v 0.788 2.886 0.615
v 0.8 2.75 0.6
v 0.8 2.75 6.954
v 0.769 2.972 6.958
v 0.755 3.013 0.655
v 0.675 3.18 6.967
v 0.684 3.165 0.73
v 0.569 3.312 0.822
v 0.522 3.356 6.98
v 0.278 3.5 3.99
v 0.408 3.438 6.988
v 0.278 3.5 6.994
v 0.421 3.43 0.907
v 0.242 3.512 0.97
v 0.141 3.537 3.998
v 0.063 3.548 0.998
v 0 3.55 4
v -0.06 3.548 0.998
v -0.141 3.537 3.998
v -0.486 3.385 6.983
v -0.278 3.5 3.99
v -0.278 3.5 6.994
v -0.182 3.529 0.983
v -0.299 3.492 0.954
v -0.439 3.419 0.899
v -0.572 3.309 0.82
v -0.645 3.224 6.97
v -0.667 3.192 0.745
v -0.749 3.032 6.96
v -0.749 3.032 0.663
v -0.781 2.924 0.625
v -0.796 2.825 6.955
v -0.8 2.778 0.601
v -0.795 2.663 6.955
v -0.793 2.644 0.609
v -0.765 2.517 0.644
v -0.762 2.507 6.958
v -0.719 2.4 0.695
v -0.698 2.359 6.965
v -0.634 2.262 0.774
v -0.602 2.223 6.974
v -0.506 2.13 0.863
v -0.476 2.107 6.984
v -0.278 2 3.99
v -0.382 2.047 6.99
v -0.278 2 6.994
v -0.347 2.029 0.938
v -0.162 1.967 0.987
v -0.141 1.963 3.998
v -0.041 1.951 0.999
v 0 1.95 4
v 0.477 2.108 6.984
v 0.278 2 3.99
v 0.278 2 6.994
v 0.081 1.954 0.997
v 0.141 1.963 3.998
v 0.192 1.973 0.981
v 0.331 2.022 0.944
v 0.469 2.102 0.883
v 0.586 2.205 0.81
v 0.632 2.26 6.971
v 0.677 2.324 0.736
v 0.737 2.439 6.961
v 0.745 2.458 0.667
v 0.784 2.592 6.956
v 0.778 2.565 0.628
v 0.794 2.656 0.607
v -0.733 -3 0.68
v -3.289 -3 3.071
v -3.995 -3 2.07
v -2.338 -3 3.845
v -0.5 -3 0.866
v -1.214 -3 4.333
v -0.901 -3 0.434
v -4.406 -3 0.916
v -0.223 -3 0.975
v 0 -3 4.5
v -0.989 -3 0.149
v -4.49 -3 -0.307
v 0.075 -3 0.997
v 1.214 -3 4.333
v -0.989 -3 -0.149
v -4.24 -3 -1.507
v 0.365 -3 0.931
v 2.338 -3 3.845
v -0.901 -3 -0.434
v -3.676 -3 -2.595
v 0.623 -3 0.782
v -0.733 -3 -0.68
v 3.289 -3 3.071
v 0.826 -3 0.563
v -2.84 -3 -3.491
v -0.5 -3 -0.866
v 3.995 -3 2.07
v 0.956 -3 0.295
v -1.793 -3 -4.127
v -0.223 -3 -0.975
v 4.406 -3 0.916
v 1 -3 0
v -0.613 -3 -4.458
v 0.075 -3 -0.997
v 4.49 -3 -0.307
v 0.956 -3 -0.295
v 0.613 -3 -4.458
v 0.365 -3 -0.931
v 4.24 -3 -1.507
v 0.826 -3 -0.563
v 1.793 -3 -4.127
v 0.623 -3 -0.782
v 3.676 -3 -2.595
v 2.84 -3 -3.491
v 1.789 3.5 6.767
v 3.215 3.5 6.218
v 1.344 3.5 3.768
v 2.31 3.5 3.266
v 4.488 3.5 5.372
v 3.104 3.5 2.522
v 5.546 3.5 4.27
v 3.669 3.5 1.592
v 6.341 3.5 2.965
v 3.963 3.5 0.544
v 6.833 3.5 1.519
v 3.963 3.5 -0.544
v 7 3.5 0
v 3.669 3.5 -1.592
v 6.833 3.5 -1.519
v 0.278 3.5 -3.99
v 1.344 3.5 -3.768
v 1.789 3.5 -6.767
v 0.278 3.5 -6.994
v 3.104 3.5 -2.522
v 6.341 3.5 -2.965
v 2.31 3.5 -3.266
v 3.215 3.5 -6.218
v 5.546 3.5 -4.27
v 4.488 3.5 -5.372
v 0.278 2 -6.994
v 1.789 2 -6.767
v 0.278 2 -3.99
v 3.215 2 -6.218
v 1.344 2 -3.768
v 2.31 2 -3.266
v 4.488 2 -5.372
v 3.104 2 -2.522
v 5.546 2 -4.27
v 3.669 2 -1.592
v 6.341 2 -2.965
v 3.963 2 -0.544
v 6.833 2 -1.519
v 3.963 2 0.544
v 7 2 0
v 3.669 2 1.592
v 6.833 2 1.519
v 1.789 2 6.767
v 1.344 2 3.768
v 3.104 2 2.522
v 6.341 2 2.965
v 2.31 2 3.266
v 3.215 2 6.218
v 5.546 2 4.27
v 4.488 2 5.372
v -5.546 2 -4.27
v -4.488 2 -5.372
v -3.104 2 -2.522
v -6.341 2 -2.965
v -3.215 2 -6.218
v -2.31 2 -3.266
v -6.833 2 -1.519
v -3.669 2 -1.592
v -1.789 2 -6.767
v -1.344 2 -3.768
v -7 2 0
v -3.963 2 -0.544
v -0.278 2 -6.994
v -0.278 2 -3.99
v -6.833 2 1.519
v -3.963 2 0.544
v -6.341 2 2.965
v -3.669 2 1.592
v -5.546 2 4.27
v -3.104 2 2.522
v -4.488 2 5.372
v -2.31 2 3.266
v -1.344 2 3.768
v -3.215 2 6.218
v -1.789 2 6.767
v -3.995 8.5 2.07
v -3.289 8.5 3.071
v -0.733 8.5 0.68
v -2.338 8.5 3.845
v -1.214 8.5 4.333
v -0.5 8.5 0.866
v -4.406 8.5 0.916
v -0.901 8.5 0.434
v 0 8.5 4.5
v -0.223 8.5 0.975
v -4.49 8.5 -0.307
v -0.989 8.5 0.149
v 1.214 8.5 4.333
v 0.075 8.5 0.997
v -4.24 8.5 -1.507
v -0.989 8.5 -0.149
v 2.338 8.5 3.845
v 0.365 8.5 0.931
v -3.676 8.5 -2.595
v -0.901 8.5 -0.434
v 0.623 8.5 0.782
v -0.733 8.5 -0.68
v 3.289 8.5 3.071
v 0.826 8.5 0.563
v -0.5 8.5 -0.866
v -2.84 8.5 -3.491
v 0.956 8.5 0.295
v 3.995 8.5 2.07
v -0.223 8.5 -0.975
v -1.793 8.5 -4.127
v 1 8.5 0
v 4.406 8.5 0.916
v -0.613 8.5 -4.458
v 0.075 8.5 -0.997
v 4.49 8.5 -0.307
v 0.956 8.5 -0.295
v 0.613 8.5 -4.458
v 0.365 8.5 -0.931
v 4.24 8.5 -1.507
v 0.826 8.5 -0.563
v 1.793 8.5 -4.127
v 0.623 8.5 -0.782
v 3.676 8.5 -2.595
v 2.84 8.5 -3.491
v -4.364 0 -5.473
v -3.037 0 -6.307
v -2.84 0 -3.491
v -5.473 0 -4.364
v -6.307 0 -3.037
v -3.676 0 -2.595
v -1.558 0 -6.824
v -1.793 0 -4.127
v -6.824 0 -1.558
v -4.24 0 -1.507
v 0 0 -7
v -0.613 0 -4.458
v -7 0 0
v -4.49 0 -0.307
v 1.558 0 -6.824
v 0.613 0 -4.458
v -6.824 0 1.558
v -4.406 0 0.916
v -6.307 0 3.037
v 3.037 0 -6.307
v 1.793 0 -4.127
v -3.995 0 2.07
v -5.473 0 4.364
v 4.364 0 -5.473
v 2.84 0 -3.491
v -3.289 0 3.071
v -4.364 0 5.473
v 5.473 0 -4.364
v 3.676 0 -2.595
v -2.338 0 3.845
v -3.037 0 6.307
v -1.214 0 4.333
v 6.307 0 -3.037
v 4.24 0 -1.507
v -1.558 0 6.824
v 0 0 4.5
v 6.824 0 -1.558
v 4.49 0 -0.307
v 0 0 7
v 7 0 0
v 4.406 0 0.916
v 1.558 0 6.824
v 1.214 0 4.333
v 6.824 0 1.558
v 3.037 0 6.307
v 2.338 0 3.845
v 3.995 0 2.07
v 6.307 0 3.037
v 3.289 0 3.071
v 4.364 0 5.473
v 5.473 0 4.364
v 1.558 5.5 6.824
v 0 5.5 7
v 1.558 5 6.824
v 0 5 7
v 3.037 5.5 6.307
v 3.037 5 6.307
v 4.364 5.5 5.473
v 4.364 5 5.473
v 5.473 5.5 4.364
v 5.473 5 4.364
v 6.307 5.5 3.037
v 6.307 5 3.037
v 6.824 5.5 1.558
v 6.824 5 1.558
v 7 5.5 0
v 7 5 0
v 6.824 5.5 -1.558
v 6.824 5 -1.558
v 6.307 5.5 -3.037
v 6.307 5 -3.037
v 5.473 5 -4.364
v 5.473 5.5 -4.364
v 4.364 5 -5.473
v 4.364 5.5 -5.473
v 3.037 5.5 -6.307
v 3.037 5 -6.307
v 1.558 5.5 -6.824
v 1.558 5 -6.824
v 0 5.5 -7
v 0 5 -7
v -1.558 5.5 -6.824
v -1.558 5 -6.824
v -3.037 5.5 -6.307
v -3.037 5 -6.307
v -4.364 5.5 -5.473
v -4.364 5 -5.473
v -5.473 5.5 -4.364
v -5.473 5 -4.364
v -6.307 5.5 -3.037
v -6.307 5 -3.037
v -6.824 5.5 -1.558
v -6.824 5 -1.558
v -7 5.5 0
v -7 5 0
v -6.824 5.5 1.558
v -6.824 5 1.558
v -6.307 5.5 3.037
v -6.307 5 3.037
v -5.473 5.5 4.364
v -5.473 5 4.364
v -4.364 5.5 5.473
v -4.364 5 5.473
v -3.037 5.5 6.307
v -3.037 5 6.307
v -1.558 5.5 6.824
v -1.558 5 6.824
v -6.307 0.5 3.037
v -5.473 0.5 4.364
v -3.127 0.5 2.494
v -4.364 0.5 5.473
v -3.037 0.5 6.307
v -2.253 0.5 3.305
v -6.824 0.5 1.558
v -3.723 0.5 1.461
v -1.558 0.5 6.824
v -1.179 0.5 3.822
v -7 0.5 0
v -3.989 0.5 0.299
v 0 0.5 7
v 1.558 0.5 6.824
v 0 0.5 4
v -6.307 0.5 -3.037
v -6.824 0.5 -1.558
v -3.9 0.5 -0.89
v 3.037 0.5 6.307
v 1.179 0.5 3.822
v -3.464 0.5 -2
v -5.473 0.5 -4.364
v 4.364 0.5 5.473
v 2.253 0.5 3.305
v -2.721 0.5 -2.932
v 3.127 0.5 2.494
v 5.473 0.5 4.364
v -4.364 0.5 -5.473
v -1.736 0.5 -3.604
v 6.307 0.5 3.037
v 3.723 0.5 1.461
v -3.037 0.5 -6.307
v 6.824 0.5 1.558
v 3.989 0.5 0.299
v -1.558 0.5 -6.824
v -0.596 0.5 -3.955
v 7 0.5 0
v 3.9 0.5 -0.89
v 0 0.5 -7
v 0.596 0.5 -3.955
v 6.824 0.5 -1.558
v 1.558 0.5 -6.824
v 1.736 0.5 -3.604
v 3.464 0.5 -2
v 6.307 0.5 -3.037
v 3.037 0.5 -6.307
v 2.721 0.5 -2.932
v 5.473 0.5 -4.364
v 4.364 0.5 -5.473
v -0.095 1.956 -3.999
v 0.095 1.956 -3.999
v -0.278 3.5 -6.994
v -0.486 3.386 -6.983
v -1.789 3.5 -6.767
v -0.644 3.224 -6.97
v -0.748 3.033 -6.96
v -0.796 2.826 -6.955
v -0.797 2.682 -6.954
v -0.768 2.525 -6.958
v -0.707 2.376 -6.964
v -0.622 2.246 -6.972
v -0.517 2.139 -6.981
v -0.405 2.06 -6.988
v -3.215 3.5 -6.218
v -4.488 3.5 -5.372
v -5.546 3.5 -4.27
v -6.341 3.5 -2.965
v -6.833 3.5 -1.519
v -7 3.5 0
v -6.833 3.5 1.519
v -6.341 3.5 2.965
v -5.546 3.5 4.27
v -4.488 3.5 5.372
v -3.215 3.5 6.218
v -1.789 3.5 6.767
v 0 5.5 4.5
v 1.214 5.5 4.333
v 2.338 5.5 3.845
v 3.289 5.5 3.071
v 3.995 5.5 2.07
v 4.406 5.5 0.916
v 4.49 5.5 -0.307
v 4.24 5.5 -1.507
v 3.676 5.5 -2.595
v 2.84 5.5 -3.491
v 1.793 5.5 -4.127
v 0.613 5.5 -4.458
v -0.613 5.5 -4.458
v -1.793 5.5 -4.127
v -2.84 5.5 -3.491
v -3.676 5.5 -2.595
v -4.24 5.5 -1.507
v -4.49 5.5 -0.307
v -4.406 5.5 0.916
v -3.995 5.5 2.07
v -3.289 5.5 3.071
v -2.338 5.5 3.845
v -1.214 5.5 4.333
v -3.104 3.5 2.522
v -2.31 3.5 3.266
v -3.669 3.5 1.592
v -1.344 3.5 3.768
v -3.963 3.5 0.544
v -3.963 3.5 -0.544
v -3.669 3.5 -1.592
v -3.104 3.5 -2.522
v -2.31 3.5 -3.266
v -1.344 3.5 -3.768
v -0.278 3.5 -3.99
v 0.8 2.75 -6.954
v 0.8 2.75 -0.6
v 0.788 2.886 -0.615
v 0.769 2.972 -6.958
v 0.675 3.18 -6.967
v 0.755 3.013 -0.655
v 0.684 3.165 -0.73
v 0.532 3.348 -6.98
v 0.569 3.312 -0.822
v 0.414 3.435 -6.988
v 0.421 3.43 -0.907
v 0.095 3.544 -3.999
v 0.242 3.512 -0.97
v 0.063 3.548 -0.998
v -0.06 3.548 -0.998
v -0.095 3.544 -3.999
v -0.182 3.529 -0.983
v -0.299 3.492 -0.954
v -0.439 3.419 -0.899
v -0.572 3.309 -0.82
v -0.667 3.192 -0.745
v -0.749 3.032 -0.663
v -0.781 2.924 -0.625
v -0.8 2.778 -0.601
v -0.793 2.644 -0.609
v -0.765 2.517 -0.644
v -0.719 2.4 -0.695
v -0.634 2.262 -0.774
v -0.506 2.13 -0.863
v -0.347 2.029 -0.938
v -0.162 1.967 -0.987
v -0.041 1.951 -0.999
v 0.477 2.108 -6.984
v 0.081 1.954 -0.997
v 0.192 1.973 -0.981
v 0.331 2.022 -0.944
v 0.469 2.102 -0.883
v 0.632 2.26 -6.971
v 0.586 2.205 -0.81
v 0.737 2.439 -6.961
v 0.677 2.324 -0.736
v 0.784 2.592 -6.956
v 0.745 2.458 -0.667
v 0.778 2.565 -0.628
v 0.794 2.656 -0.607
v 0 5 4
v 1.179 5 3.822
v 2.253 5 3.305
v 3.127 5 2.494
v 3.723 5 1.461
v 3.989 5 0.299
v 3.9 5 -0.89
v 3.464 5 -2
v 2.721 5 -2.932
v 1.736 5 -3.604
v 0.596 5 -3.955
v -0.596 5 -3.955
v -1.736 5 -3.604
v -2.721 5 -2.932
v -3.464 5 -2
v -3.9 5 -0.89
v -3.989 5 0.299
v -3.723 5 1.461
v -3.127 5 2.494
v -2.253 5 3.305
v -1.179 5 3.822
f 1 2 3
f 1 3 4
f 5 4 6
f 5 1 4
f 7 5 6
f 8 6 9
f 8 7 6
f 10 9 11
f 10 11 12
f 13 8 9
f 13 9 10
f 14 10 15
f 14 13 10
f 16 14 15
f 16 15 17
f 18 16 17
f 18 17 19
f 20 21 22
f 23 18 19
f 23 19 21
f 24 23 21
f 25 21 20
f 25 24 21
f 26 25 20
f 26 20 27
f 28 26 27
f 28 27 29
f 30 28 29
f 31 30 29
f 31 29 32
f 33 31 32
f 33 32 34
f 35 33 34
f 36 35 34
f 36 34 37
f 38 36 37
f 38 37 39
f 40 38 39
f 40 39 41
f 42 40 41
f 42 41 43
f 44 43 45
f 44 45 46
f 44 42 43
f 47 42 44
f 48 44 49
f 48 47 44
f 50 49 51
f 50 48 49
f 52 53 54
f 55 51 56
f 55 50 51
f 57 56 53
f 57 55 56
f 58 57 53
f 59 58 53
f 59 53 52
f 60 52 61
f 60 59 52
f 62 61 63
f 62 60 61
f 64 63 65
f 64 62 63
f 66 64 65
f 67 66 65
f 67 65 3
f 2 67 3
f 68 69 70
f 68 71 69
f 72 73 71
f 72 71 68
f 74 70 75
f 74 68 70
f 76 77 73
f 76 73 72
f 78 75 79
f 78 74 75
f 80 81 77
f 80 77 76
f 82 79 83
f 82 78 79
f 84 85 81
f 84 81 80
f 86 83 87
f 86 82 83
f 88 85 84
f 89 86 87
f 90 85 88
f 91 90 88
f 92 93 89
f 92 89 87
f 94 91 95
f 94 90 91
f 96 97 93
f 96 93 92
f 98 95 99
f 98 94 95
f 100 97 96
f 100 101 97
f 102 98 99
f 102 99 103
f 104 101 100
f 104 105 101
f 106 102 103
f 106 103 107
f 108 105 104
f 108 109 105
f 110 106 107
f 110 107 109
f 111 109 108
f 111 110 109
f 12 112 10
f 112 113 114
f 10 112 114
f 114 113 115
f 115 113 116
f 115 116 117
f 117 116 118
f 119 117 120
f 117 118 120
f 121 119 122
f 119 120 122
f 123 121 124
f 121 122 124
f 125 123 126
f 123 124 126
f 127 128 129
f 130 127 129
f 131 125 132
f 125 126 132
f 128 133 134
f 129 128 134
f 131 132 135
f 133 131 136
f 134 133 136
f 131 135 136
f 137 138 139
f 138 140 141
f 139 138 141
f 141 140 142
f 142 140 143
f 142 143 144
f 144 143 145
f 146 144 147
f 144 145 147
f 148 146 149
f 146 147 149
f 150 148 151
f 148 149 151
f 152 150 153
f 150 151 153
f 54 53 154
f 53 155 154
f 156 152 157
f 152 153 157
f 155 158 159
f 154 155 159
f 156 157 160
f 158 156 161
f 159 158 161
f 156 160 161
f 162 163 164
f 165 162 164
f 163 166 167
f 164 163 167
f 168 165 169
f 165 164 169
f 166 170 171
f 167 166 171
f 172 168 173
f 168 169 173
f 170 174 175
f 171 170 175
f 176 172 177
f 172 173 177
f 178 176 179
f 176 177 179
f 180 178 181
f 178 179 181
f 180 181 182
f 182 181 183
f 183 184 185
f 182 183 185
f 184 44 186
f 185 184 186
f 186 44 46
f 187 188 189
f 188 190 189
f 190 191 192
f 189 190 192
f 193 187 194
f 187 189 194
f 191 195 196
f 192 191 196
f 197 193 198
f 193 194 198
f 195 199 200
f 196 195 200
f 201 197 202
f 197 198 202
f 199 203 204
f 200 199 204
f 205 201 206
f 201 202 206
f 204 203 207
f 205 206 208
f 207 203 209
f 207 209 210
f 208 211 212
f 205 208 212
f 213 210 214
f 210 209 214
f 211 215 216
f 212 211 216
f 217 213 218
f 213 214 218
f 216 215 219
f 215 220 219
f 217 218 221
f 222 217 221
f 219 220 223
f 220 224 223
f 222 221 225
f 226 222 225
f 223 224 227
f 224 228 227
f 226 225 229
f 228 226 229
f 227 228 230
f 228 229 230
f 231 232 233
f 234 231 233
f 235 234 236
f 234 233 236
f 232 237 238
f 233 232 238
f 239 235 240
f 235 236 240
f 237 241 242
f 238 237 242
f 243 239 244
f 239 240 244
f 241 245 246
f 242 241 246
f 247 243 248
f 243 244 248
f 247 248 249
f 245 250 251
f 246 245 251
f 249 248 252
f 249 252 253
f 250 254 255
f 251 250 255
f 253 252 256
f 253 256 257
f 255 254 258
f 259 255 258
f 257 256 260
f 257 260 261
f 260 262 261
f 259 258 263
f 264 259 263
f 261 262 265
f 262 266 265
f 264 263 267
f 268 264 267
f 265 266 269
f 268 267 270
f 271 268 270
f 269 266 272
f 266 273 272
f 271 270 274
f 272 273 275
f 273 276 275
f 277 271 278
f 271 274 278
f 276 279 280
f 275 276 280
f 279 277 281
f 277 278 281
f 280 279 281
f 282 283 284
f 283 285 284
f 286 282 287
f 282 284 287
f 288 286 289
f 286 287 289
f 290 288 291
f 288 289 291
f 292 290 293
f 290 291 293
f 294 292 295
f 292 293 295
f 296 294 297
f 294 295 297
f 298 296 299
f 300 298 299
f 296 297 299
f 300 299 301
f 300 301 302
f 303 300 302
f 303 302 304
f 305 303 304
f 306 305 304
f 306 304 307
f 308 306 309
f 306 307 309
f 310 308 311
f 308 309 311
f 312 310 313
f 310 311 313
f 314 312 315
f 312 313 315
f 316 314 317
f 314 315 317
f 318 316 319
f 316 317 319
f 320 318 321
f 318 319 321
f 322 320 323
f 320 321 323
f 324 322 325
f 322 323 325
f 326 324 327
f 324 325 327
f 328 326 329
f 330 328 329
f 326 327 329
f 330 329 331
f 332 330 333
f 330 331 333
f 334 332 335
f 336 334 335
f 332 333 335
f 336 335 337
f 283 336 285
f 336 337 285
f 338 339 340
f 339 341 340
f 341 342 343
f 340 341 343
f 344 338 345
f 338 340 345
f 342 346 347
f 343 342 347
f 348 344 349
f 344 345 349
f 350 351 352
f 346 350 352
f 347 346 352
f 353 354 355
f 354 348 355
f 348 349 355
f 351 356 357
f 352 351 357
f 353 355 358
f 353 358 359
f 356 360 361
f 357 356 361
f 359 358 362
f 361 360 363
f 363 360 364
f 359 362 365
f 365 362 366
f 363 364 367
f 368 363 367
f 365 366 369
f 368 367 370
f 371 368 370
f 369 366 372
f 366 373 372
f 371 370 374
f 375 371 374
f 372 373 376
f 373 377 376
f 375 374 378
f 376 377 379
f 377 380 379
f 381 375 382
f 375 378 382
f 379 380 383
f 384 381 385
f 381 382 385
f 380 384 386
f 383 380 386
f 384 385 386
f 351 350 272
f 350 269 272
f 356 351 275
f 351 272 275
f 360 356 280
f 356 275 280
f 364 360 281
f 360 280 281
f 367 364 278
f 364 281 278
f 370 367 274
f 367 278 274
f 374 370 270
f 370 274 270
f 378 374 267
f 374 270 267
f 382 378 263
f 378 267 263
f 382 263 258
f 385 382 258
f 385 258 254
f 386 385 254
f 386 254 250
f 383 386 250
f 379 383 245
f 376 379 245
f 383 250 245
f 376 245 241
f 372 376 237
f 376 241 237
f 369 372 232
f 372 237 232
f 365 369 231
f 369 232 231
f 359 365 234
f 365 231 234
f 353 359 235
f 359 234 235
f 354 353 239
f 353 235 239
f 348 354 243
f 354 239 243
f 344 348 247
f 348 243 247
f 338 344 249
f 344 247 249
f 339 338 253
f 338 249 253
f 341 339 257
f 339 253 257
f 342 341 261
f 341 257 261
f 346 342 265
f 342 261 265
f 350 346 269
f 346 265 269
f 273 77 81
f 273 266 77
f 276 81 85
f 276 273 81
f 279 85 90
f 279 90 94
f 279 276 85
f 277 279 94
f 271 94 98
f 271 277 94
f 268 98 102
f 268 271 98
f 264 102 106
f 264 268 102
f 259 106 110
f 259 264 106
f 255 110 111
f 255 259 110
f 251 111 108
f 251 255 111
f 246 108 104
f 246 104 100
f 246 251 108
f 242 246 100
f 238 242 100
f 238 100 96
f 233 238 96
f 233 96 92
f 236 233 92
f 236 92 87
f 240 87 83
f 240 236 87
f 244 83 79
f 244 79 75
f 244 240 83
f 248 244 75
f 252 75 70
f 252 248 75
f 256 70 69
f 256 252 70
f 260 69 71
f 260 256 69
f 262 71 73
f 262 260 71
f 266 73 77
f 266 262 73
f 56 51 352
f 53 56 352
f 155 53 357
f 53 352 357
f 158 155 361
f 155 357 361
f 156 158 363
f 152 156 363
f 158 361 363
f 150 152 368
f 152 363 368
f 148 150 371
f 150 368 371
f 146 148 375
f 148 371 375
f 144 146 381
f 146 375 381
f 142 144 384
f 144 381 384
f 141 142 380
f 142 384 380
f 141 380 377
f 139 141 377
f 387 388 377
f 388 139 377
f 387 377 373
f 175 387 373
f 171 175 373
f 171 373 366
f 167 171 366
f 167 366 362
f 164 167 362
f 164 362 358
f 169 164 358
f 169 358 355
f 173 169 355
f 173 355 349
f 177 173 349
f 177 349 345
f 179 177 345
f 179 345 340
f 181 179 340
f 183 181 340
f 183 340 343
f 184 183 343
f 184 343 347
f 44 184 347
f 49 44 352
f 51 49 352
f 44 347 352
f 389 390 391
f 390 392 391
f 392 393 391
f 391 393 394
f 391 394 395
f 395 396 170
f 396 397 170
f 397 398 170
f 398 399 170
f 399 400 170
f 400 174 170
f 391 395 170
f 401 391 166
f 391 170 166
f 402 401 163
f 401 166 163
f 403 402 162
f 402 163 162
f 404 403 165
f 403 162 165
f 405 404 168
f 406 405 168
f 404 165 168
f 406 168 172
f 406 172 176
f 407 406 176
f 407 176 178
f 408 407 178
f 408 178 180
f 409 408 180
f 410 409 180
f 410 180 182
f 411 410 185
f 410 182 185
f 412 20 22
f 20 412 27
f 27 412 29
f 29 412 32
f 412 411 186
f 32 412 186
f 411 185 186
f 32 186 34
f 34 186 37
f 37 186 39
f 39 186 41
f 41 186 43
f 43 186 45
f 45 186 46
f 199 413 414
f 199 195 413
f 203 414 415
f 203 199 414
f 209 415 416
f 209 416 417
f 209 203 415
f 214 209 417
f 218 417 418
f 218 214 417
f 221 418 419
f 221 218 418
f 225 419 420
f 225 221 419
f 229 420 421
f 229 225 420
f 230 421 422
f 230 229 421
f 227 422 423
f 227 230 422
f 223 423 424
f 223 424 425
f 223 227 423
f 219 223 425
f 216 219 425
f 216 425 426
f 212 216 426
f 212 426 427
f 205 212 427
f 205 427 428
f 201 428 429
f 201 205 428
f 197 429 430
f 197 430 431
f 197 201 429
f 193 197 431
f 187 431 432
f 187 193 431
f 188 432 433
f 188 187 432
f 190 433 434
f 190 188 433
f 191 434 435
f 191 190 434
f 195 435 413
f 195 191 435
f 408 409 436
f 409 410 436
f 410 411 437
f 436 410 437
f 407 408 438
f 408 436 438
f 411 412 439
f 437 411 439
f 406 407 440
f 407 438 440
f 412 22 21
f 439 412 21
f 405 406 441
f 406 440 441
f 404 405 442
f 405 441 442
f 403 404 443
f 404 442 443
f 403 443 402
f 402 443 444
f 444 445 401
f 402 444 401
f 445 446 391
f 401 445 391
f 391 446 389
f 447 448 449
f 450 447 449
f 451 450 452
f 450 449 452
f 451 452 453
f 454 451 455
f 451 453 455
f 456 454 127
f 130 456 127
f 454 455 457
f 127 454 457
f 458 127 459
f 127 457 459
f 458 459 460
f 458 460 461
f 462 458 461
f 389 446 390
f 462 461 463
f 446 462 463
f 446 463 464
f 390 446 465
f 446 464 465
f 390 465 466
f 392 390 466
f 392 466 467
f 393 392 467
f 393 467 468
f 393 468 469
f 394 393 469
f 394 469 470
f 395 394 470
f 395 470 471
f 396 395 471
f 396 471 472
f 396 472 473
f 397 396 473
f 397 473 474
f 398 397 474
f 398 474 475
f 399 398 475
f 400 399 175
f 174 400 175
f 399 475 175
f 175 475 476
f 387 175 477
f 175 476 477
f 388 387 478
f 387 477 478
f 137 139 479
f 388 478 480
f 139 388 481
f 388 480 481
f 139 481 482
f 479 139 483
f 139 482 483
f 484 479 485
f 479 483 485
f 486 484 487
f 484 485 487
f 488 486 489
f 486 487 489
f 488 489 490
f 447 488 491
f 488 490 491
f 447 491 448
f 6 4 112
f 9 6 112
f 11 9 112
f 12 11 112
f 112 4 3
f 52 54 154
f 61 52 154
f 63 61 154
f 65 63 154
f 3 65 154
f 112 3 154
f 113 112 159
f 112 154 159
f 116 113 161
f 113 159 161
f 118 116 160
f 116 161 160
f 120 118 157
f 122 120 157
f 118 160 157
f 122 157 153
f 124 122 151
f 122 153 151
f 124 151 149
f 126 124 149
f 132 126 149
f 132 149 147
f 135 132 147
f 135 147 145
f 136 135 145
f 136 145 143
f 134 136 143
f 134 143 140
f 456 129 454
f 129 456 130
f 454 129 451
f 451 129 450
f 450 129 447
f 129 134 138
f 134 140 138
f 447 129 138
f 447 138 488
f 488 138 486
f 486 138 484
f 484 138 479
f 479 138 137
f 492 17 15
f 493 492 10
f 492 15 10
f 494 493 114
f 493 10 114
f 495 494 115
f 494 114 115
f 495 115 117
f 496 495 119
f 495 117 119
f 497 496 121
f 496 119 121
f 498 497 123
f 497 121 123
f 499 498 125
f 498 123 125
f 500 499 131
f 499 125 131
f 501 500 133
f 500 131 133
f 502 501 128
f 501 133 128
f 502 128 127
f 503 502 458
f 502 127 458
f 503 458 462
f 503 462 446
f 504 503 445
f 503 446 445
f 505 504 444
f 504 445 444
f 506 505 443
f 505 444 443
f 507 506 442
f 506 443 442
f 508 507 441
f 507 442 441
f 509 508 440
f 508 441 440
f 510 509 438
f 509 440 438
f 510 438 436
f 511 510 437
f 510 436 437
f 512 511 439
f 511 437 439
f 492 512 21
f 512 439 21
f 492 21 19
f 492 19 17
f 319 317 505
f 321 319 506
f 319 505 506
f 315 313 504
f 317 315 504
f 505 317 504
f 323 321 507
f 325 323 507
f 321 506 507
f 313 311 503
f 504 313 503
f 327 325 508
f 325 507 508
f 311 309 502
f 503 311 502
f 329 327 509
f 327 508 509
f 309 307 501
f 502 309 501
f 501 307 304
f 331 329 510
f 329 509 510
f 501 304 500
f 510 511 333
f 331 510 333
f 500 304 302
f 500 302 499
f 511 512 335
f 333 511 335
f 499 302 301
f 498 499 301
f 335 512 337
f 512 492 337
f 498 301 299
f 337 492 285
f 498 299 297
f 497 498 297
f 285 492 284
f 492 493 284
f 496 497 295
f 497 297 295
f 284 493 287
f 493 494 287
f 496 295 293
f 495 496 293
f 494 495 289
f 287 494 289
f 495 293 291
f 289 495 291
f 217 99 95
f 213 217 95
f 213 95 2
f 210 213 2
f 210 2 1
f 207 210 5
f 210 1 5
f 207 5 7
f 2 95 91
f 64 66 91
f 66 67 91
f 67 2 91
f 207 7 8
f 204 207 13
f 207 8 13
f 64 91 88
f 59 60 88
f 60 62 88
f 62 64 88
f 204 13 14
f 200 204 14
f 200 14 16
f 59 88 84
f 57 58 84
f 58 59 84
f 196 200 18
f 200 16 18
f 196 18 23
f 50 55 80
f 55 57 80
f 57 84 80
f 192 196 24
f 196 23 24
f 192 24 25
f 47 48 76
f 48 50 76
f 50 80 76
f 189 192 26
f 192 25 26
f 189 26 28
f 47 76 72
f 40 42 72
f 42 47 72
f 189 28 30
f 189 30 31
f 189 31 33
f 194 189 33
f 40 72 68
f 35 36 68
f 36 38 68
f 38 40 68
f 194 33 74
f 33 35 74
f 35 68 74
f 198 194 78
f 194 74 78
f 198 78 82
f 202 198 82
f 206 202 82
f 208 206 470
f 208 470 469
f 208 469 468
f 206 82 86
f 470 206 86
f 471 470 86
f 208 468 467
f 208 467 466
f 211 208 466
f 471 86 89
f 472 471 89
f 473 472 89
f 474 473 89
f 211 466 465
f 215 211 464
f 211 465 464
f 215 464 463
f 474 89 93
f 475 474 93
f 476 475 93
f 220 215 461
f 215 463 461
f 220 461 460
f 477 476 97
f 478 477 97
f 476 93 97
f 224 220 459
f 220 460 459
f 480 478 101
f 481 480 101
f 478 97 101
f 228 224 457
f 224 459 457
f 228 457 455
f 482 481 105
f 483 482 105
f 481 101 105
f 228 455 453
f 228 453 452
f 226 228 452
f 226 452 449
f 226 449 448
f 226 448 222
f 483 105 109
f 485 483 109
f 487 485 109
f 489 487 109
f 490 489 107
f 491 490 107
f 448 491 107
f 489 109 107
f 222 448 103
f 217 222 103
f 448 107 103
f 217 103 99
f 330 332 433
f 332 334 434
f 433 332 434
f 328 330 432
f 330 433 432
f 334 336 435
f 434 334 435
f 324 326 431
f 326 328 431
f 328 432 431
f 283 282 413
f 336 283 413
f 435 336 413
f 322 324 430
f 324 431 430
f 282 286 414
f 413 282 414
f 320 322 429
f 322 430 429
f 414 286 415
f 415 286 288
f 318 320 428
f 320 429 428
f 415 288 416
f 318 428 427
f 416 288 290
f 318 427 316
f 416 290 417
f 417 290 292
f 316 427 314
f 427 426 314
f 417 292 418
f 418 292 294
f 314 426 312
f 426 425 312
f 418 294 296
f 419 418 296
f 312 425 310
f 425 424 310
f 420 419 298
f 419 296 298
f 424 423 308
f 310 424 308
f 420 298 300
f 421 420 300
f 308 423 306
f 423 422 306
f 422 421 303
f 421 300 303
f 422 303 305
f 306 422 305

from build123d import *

# Parameters (mm, degrees)
F0_W          = 3
F0_H          = 4.5
F2_R          = 0.8
F3_DEPTH      = 25
F4_DEPTH      = 25
F4_DEPTH_BACK = 25
F5_R          = 1
F6_DEPTH      = 25


with BuildPart() as f1:
    # F0 (on Right) → F1 (revolve)
    with BuildSketch(Plane.YZ):
        Polygon((0, 4.5), (0, 0), (5.5, 0), (5.5, 4.5), (5.5, 7), (5, 7), (5, 4), (3.5, 4), (3.5, 7), (2, 7), (2, 4), (0.5, 4), (0.5, 7), (0, 7), align=None)
        with Locations((7, 2.25)):
            Rectangle(F0_W, F0_H)
        with Locations((-1.5, 2.25)):
            Rectangle(F0_W, F0_H)
    revolve(axis=Axis((0, 2.7052562218, 0), (0, 1, 0)))

    # F2 (on Top) → F3 (cut)
    with BuildSketch(Plane.XY):
        with Locations((0, 2.75)):
            Circle(F2_R)
    extrude(amount=-F3_DEPTH, mode=Mode.SUBTRACT)

    # F2 (on Top) → F4 (cut, two sides)
    with BuildSketch(Plane.XY) as f4_sk:
        with Locations((0, 2.75)):
            Circle(F2_R)
    extrude(amount=-F4_DEPTH, mode=Mode.SUBTRACT)
    extrude(f4_sk.sketch, amount=F4_DEPTH_BACK, mode=Mode.SUBTRACT)

    # F5 (on face) → F6 (cut)
    with BuildSketch(Plane.XZ.offset(3)):
        Circle(F5_R)
    extrude(amount=-F6_DEPTH, mode=Mode.SUBTRACT)


solid = f1.part
